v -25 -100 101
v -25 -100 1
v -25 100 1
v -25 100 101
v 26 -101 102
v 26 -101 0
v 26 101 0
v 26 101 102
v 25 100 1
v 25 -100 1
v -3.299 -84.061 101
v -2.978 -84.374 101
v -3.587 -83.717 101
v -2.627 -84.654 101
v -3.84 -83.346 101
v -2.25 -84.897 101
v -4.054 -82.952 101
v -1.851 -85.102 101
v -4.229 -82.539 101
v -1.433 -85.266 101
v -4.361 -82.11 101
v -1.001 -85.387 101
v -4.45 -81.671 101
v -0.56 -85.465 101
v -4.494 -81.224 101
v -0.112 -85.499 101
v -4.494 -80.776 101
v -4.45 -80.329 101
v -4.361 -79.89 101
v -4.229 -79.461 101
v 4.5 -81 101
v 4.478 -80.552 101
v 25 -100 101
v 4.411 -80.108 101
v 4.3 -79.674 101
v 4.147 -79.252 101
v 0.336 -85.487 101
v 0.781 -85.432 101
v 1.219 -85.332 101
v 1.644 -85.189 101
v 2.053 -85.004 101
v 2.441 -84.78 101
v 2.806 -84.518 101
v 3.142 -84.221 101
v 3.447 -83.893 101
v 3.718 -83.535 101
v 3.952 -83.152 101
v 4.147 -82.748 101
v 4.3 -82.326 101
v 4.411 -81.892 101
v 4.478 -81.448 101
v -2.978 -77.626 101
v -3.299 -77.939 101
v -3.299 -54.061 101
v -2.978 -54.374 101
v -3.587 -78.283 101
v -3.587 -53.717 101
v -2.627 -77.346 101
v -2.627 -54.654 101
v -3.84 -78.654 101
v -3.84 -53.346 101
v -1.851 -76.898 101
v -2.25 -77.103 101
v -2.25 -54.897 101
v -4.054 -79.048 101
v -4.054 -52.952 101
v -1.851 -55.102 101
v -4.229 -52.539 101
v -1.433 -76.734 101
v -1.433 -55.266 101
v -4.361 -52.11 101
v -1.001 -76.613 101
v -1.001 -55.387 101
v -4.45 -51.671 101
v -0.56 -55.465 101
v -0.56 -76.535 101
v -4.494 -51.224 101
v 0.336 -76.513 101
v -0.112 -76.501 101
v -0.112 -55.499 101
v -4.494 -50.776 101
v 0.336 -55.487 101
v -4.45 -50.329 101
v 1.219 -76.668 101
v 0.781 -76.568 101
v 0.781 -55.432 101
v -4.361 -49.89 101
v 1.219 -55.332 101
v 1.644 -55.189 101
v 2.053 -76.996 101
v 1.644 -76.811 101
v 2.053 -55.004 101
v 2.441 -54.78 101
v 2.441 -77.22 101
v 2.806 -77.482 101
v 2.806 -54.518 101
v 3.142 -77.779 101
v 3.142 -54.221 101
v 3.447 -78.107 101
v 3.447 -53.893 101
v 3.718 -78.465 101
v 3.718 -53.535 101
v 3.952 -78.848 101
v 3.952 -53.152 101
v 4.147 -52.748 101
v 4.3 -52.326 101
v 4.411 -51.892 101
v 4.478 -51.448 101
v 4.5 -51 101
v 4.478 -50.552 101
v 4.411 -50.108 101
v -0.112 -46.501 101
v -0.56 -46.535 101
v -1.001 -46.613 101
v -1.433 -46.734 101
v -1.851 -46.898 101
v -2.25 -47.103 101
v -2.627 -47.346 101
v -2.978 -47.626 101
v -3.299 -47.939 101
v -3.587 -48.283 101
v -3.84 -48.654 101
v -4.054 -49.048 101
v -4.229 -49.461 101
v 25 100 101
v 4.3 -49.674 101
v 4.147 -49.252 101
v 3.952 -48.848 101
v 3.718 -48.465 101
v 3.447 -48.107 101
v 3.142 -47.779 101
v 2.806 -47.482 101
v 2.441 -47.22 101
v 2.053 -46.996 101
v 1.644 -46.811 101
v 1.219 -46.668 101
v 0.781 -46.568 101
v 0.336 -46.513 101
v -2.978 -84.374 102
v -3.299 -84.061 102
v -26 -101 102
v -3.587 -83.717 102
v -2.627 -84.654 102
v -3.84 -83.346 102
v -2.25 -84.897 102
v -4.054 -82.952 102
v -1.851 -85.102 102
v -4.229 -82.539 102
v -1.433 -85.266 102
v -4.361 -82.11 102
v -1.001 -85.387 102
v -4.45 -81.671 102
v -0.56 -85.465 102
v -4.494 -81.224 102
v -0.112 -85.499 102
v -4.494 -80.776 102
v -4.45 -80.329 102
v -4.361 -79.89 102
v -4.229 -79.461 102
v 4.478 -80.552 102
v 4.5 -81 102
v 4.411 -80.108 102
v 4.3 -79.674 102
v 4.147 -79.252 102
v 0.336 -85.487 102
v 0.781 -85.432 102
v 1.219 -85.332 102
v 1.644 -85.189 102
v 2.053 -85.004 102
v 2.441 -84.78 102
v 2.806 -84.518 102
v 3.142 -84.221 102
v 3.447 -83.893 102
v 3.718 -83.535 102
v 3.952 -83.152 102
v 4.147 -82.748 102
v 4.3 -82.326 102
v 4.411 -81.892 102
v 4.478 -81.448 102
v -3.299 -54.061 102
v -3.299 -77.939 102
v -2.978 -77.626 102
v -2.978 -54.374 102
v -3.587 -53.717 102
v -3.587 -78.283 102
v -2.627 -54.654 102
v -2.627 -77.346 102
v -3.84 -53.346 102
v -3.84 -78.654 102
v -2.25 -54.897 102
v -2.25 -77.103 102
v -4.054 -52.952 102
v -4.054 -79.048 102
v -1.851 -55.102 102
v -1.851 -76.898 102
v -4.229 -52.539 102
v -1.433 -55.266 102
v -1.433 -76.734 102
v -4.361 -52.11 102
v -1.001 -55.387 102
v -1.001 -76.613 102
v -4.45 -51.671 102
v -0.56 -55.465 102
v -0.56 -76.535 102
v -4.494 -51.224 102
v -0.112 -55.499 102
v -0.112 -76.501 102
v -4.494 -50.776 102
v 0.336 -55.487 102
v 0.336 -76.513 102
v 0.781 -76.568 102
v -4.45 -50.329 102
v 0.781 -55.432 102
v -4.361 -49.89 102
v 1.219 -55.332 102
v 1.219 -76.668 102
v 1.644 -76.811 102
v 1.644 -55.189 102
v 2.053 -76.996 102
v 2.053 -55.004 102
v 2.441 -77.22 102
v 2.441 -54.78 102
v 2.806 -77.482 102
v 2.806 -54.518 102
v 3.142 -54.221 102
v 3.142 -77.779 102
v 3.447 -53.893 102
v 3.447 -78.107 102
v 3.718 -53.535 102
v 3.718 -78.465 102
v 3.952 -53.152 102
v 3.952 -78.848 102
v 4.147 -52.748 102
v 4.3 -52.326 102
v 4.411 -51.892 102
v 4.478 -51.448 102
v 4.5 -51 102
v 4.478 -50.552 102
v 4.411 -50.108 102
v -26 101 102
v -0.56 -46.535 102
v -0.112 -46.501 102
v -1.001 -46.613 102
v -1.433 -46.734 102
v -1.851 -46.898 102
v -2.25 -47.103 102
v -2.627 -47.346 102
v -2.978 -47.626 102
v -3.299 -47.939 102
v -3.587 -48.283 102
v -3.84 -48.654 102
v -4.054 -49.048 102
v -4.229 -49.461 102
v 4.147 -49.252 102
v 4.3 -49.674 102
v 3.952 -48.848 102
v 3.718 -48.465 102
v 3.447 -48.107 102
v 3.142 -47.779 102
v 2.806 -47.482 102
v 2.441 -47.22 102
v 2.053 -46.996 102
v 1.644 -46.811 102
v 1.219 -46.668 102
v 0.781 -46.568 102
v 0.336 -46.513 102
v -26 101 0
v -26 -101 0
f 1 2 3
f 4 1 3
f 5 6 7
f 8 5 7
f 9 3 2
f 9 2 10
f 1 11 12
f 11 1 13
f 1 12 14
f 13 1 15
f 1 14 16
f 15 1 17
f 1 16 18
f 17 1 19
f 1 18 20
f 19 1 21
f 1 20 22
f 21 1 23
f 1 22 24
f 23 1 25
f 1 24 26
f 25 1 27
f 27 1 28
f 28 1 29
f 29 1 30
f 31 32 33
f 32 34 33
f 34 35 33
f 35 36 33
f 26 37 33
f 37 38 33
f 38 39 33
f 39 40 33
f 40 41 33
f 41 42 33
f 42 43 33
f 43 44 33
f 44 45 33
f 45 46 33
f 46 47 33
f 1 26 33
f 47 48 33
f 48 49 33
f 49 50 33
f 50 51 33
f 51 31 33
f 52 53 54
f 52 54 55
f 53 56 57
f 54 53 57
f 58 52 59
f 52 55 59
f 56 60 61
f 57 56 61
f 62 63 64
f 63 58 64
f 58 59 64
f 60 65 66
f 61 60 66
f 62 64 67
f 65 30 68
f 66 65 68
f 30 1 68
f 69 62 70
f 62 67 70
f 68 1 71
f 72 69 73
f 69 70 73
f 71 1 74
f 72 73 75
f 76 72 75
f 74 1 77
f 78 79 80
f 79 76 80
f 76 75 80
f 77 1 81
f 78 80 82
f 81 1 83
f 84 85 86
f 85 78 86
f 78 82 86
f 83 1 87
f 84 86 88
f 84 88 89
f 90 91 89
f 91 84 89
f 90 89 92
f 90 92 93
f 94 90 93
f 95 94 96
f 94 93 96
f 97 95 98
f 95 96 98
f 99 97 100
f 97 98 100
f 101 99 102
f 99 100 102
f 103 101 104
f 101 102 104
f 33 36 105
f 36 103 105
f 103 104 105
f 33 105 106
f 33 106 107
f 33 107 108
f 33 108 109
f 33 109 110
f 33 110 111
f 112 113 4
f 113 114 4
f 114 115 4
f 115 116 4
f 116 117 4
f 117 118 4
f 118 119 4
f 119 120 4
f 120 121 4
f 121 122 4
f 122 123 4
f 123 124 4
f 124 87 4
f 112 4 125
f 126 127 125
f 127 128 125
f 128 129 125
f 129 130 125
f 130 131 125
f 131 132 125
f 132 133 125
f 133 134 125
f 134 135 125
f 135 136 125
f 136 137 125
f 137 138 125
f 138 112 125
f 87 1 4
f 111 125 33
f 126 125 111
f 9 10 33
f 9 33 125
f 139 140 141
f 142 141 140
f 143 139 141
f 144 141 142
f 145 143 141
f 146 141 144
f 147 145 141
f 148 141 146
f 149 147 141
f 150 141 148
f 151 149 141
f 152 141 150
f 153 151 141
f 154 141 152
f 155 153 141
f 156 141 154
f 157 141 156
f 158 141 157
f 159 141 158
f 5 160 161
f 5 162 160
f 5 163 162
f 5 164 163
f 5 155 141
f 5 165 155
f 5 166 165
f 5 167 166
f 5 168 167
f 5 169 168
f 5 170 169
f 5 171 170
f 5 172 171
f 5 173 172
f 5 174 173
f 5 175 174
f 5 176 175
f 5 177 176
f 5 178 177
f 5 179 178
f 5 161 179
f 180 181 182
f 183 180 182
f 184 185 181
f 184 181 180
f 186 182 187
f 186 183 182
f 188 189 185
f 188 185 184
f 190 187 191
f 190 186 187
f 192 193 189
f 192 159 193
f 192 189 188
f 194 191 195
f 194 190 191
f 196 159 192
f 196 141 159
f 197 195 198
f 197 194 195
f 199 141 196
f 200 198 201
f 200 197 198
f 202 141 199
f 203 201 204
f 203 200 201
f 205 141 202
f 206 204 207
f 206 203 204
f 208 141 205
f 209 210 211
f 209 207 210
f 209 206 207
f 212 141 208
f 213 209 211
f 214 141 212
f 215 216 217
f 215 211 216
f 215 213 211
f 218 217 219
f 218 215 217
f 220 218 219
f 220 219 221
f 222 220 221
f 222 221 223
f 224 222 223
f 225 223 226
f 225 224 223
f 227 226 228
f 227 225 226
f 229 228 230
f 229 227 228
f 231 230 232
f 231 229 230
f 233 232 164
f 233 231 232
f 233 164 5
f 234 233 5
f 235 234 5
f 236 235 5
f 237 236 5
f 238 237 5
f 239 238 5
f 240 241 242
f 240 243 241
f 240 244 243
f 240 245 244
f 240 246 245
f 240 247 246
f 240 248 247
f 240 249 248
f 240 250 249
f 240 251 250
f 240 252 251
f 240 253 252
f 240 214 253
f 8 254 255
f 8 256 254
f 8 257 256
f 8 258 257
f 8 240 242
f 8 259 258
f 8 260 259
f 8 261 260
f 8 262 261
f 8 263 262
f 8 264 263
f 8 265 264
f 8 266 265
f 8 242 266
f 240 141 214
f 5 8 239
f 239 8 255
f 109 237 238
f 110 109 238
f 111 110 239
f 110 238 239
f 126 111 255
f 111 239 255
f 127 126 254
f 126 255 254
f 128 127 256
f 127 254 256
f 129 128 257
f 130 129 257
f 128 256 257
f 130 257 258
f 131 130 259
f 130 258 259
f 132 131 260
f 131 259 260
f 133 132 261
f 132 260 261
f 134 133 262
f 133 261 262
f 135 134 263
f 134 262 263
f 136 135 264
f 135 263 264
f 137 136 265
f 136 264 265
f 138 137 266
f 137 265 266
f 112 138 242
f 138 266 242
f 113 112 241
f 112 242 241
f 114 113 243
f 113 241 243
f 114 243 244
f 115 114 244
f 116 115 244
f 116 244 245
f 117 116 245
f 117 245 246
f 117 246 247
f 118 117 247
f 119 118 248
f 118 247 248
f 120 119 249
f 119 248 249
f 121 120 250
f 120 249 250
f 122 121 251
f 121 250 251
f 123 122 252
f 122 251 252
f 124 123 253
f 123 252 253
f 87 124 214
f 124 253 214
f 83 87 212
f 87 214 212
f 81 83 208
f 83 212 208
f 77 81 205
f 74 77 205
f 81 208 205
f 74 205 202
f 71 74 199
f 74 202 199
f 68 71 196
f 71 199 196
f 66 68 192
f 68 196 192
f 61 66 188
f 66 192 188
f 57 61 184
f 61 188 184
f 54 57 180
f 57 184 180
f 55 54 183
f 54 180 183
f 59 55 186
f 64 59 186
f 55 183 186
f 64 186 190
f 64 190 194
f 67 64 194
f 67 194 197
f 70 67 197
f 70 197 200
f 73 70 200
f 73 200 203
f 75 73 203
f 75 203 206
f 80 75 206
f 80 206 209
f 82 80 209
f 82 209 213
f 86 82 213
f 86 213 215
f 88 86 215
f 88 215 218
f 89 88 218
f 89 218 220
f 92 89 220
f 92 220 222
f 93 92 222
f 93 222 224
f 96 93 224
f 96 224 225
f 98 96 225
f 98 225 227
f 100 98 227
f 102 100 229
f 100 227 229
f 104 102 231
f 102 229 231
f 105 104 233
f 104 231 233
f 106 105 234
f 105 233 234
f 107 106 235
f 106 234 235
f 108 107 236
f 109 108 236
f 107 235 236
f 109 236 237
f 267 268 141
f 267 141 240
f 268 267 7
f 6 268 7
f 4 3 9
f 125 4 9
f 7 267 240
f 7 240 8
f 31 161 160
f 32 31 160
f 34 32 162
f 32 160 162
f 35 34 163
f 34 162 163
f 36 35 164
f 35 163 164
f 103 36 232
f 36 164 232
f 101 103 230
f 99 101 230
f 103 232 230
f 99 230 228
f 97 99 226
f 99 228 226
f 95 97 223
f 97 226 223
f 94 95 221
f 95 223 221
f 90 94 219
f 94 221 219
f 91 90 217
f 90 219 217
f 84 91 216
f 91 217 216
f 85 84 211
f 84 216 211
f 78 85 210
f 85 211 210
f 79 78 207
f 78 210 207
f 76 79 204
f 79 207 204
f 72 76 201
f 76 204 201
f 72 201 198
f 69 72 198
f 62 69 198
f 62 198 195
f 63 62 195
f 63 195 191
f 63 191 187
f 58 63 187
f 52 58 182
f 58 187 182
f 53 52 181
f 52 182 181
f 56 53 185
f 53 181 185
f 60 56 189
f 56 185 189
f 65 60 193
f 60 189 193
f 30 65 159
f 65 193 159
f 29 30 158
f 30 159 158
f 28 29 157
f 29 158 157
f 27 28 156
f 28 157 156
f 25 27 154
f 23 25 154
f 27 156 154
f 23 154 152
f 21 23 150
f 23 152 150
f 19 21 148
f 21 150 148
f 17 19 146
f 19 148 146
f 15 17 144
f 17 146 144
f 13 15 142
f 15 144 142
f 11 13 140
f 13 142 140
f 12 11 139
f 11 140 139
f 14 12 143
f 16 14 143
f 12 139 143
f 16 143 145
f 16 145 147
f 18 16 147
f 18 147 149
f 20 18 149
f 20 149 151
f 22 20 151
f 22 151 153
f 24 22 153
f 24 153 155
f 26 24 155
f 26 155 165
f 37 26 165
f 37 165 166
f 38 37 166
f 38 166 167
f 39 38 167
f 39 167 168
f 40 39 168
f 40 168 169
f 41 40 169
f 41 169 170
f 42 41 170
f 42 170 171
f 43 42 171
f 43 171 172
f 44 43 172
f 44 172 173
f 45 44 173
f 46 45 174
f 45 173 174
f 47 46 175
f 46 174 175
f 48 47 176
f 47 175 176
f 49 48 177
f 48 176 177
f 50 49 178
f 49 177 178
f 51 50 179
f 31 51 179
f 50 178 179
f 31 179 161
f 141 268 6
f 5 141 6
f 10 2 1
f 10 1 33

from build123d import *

# Parameters (mm, degrees)
ESQUISSE1_W             = 52
ESQUISSE1_H             = 202
BOSS_EXTRU_1_DEPTH      = 102
COQUE1_T                = -1
ESQUISSE2_W             = 50
ESQUISSE2_H             = 200
BOSS_EXTRU_2_DEPTH      = 1
ESQUISSE3_R             = 4.5
ENL_V_MAT_EXTRU_1_DEPTH = 1


with BuildPart() as part:
    # Esquisse1 → Boss.-Extru.1 (new body)
    with BuildSketch(Plane.XY):
        Rectangle(ESQUISSE1_W, ESQUISSE1_H)
    extrude(amount=BOSS_EXTRU_1_DEPTH)

    # Coque1
    coque1_openings = [part.faces().sort_by_distance(p)[0] for p in [
        (0, 0, 102),
    ]]
    offset(amount=COQUE1_T, openings=coque1_openings, kind=Kind.INTERSECTION)

    # Esquisse2 → Boss.-Extru.2 (add)
    with BuildSketch(Plane.XY.offset(102)):
        Rectangle(ESQUISSE2_W, ESQUISSE2_H)
    extrude(amount=-BOSS_EXTRU_2_DEPTH)

    # Esquisse3 → Enlèv. mat.-Extru.1 (cut)
    with BuildSketch(Plane.XY.offset(102)):
        with Locations((0, -81)):
            Circle(ESQUISSE3_R)
        with Locations((0, -51)):
            Circle(ESQUISSE3_R)
    extrude(amount=-ENL_V_MAT_EXTRU_1_DEPTH, mode=Mode.SUBTRACT)


solid = part.part
